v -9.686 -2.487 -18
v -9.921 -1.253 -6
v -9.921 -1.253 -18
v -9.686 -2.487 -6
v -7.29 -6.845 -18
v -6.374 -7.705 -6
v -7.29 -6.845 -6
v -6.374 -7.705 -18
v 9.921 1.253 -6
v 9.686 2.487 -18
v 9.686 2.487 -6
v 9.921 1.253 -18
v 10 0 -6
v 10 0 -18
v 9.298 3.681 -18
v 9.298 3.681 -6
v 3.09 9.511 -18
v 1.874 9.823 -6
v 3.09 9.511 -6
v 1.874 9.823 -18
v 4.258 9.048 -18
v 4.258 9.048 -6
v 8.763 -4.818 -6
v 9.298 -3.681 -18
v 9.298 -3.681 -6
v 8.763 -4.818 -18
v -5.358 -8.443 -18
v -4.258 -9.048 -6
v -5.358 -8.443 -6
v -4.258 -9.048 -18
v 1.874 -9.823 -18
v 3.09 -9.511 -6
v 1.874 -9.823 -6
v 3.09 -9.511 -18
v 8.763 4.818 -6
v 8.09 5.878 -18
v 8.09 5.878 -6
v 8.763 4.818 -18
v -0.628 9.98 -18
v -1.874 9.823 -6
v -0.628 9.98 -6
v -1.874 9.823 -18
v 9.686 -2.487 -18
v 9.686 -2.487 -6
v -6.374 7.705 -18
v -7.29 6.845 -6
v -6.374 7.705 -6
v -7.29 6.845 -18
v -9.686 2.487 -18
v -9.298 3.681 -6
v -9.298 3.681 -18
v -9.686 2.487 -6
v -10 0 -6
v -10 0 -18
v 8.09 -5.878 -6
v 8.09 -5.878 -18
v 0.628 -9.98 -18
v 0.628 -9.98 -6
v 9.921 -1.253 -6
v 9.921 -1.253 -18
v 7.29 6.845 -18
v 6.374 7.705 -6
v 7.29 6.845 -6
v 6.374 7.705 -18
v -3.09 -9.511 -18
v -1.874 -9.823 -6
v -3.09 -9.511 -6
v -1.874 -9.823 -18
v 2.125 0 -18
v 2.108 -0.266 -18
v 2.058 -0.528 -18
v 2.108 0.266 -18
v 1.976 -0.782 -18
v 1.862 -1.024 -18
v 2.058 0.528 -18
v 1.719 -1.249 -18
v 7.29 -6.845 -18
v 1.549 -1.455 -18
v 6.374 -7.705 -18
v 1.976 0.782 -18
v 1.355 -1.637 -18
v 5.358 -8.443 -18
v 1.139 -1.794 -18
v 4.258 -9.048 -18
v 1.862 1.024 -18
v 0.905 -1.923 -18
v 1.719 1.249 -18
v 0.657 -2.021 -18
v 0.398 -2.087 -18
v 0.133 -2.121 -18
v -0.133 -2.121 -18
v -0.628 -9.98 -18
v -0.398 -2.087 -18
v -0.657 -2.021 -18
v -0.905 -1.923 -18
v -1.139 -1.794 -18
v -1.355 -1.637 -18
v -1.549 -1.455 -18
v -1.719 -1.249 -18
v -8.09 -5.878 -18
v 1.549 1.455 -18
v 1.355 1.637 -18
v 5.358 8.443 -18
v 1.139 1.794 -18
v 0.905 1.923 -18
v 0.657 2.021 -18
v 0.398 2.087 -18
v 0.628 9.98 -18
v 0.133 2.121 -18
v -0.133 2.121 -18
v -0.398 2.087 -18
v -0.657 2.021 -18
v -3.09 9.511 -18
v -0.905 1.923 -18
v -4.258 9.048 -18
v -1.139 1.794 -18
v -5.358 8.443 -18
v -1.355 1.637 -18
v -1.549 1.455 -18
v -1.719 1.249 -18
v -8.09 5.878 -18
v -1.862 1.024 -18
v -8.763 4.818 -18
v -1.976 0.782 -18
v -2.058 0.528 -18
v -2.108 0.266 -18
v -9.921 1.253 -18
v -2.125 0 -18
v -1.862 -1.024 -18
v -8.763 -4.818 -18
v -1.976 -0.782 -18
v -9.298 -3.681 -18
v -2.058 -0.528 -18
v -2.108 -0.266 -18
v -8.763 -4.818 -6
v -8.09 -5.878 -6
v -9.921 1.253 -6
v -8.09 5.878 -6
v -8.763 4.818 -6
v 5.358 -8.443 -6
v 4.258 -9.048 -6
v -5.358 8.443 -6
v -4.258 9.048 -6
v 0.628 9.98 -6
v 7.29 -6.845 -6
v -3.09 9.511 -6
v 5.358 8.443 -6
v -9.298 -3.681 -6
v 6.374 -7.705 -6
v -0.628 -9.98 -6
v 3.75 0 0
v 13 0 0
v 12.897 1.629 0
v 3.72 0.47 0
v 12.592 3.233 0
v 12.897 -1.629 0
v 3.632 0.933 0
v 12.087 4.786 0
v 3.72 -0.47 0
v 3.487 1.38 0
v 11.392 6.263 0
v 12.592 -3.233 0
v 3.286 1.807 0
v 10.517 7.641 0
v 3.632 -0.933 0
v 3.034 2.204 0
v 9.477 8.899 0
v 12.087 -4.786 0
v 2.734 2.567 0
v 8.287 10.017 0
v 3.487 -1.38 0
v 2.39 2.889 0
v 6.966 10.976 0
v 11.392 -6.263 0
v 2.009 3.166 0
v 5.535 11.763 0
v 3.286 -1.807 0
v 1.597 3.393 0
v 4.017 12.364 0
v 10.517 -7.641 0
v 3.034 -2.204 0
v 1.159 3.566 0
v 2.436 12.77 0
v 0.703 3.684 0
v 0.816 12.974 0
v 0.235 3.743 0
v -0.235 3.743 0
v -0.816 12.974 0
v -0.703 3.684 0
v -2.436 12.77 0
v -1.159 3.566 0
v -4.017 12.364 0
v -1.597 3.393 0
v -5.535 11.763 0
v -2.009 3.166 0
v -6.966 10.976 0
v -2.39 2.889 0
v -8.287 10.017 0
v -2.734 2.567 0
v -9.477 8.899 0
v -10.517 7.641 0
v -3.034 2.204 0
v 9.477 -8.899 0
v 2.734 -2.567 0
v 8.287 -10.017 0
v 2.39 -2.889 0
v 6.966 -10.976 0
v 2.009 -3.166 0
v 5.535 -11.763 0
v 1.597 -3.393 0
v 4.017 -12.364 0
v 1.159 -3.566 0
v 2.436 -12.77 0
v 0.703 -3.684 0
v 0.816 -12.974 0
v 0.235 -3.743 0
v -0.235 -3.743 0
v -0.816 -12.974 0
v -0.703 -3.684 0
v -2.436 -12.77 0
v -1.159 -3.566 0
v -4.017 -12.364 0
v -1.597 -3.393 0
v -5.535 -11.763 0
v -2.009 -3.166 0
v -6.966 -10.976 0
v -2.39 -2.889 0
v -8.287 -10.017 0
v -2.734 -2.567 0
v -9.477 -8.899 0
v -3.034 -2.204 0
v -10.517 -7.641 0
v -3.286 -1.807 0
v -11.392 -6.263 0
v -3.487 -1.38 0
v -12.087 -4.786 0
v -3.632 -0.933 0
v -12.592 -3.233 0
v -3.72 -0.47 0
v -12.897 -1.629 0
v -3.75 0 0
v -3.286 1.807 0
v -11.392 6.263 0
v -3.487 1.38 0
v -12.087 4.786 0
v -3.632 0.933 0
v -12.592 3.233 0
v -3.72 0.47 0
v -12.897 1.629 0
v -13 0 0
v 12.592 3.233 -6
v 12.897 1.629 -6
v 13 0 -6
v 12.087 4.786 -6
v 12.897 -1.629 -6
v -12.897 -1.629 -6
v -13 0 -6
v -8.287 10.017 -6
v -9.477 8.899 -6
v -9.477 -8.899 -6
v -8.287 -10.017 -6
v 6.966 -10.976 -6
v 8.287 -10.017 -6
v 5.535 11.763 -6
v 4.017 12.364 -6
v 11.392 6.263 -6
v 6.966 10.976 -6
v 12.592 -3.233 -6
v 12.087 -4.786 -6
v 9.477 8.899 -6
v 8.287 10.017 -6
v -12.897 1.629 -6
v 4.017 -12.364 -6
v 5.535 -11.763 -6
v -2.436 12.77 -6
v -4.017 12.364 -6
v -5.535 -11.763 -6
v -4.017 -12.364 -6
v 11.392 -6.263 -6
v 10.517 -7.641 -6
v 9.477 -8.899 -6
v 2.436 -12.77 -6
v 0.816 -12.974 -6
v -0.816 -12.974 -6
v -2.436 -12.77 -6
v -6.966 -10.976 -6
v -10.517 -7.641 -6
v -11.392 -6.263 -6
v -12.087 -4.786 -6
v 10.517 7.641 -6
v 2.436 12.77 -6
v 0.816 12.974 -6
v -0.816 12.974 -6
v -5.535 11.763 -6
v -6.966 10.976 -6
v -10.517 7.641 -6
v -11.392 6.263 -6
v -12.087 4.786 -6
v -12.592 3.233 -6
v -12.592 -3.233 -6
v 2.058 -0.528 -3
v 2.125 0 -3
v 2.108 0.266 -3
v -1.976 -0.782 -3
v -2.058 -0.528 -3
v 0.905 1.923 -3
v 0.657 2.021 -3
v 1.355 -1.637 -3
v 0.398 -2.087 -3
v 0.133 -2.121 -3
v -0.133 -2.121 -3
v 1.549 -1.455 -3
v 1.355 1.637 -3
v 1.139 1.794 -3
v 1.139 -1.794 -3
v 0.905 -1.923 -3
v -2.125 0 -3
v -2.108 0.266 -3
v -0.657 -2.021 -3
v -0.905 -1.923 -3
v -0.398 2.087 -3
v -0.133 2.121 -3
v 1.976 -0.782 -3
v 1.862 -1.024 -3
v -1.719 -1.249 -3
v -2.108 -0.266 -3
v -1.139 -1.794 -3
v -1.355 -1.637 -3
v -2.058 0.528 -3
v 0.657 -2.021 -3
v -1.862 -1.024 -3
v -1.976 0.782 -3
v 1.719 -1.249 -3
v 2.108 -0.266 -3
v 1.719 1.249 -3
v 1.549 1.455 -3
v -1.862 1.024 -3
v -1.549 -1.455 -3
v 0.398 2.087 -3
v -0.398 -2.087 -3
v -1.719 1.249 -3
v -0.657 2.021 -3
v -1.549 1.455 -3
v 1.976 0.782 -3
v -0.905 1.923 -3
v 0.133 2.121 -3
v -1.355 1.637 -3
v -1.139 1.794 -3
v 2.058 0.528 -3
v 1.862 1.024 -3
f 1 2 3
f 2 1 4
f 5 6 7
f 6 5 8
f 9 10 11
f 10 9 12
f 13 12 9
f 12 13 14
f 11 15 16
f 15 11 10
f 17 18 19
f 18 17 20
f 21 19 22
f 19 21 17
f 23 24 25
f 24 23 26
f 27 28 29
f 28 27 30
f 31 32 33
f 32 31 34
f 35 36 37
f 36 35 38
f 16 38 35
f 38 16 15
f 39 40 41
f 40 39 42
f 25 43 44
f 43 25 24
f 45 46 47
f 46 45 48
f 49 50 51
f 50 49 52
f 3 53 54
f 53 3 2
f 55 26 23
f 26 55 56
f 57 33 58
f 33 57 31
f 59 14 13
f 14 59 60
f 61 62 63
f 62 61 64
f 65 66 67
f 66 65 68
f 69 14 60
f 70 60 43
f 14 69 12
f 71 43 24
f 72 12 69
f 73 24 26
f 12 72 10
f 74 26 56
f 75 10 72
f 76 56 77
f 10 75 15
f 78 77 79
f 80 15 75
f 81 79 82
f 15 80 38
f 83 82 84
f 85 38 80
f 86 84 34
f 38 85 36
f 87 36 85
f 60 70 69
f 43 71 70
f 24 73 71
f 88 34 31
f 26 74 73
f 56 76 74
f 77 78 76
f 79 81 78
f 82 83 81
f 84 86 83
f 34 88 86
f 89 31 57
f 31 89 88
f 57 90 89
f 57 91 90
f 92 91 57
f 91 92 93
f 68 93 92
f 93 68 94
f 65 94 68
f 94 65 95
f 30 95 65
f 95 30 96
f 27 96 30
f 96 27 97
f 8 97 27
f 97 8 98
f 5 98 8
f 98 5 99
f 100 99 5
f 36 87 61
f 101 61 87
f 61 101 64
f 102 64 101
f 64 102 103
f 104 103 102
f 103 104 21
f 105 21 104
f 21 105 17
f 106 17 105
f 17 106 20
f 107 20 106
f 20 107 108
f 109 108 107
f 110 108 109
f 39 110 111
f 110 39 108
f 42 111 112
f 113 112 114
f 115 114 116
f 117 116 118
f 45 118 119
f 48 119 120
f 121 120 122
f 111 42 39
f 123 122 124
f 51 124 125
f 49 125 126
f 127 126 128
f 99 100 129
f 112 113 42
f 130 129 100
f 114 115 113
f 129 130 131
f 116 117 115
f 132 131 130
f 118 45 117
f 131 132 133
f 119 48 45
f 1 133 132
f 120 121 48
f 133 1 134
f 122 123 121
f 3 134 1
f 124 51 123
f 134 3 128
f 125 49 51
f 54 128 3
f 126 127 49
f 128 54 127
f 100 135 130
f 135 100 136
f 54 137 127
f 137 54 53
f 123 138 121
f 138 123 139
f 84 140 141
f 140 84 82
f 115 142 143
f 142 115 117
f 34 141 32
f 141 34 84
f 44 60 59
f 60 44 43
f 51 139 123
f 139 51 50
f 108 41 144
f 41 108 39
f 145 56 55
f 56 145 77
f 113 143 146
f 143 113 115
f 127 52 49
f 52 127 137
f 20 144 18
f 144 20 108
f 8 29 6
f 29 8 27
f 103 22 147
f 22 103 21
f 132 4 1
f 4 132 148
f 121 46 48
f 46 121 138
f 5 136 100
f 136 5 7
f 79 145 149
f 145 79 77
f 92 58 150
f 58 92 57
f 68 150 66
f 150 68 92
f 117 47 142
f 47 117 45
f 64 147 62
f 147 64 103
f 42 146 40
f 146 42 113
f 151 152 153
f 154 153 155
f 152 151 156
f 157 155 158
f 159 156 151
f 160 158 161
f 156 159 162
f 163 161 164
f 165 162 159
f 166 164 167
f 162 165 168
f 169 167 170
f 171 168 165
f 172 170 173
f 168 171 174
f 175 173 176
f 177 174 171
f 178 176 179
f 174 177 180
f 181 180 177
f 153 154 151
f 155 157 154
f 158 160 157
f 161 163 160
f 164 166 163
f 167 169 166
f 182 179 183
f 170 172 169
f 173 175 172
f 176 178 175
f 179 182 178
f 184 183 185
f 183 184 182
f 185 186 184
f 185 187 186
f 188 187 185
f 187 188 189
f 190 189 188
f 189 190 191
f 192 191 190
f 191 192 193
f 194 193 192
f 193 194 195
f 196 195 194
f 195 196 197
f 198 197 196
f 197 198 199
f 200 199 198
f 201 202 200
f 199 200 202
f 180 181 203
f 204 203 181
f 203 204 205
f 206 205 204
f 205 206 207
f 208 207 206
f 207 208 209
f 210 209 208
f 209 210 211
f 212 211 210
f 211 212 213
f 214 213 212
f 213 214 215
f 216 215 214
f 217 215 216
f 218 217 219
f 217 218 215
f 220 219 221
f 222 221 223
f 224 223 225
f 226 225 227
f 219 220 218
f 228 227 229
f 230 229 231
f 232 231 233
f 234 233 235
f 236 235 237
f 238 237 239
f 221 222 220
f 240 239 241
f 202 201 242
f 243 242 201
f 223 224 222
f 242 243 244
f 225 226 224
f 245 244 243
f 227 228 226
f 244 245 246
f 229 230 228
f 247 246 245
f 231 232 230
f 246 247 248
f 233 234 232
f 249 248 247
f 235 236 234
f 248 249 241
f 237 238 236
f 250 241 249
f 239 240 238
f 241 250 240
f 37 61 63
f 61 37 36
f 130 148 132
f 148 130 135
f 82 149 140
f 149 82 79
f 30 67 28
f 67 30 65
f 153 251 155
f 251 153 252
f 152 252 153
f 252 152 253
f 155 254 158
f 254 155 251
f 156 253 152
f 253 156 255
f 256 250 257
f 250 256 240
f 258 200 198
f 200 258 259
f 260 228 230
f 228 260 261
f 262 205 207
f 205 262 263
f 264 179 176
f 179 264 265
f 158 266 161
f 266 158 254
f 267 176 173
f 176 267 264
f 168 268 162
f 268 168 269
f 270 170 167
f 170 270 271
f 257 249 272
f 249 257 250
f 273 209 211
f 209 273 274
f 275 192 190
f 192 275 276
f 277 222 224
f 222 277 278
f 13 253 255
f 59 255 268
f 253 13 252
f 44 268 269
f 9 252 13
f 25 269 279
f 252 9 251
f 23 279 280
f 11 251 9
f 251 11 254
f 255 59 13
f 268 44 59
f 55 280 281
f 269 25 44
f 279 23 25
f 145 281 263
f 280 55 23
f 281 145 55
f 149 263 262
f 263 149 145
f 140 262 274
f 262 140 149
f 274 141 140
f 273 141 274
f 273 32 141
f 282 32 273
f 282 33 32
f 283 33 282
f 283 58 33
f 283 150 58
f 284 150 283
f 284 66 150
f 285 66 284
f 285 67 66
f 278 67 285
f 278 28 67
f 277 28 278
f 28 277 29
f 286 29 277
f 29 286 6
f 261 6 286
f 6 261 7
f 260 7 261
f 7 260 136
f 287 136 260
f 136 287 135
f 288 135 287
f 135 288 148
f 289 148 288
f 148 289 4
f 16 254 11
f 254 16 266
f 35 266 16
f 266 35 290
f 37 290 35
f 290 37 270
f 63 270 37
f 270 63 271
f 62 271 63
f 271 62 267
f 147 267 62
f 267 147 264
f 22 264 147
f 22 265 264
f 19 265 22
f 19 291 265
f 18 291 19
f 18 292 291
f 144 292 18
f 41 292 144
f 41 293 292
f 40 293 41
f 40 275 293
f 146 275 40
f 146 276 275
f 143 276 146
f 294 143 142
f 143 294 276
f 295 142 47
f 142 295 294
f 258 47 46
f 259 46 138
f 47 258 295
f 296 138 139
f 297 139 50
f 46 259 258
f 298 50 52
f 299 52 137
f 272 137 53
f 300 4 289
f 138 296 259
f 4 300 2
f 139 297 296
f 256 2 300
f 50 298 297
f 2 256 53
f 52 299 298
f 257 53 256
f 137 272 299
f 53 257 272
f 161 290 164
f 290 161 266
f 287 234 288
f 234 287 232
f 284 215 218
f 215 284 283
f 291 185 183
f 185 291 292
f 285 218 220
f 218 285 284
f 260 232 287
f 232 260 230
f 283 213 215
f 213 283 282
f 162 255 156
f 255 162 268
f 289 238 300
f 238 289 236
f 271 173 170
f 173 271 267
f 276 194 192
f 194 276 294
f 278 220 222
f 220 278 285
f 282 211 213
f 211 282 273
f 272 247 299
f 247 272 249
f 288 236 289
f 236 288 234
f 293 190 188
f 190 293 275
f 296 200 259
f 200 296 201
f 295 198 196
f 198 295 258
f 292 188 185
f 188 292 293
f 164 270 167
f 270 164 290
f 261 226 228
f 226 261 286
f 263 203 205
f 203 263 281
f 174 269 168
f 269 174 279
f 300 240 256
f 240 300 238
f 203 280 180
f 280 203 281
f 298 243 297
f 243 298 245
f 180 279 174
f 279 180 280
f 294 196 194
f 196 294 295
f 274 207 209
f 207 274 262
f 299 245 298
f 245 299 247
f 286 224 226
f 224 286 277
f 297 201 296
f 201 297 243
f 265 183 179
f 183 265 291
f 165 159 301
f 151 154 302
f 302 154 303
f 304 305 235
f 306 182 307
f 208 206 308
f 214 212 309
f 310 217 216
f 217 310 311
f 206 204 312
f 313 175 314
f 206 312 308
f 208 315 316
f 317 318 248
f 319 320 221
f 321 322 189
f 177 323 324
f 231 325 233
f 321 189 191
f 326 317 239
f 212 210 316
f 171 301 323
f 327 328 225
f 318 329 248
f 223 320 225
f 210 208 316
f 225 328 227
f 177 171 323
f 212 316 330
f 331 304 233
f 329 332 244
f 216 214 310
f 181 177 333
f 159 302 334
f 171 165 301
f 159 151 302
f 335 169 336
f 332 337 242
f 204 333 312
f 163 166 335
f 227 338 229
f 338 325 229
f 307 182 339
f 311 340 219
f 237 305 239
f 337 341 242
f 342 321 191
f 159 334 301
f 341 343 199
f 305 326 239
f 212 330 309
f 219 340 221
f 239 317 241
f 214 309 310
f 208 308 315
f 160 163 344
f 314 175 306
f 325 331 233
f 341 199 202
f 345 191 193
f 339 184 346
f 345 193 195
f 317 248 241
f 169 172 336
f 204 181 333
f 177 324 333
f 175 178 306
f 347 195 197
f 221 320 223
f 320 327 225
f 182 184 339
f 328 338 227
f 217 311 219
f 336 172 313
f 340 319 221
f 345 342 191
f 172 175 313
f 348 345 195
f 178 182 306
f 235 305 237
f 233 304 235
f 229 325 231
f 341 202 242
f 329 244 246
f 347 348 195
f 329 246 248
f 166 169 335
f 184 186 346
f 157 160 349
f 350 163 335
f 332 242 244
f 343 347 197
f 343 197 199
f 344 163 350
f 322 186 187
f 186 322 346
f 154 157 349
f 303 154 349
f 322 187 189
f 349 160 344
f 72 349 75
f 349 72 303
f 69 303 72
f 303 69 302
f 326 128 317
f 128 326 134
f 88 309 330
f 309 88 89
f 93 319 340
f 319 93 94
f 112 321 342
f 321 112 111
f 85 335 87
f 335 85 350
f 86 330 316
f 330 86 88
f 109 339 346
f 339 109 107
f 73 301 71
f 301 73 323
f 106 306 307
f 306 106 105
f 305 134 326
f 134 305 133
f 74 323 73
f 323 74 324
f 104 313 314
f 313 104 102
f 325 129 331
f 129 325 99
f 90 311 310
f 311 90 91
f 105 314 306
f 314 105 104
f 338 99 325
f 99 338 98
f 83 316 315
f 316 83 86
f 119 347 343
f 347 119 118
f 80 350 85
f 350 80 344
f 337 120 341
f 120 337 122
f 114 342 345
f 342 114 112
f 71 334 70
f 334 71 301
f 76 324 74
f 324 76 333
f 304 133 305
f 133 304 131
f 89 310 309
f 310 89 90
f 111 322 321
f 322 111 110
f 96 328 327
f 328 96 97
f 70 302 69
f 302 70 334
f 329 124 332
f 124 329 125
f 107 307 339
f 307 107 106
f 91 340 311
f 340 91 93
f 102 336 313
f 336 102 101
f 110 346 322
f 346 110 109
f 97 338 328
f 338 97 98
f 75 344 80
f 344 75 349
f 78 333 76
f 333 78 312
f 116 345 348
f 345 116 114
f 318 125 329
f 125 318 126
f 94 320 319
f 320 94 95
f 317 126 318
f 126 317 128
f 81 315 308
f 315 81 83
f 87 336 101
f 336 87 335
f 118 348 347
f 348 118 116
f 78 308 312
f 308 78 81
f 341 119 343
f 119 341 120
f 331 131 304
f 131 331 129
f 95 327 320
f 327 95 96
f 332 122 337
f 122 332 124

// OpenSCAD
$fn = 50;


difference() {
	union() {
		translate(v = [0, 0, -18.0000000000]) {
			cylinder(h = 18, r = 10.0000000000);
		}
		translate(v = [0, 0, -6.0000000000]) {
			cylinder(h = 6, r = 13.0000000000);
		}
	}
	union() {
		translate(v = [0, 0, 0]) {
			rotate(a = [0, 0, 0]) {
				difference() {
					union() {
						#translate(v = [0, 0, -18.0000000000]) {
							cylinder(h = 18, r = 2.0000000000);
						}
						#translate(v = [0, 0, -3]) {
							cylinder(h = 3, r1 = 2.1250000000, r2 = 3.7500000000);
						}
						#translate(v = [0, 0, -18.0000000000]) {
							cylinder(h = 18, r = 2.1250000000);
						}
						#translate(v = [0, 0, -18.0000000000]) {
							cylinder(h = 18, r = 2.0000000000);
						}
					}
					union();
				}
			}
		}
	}
}
